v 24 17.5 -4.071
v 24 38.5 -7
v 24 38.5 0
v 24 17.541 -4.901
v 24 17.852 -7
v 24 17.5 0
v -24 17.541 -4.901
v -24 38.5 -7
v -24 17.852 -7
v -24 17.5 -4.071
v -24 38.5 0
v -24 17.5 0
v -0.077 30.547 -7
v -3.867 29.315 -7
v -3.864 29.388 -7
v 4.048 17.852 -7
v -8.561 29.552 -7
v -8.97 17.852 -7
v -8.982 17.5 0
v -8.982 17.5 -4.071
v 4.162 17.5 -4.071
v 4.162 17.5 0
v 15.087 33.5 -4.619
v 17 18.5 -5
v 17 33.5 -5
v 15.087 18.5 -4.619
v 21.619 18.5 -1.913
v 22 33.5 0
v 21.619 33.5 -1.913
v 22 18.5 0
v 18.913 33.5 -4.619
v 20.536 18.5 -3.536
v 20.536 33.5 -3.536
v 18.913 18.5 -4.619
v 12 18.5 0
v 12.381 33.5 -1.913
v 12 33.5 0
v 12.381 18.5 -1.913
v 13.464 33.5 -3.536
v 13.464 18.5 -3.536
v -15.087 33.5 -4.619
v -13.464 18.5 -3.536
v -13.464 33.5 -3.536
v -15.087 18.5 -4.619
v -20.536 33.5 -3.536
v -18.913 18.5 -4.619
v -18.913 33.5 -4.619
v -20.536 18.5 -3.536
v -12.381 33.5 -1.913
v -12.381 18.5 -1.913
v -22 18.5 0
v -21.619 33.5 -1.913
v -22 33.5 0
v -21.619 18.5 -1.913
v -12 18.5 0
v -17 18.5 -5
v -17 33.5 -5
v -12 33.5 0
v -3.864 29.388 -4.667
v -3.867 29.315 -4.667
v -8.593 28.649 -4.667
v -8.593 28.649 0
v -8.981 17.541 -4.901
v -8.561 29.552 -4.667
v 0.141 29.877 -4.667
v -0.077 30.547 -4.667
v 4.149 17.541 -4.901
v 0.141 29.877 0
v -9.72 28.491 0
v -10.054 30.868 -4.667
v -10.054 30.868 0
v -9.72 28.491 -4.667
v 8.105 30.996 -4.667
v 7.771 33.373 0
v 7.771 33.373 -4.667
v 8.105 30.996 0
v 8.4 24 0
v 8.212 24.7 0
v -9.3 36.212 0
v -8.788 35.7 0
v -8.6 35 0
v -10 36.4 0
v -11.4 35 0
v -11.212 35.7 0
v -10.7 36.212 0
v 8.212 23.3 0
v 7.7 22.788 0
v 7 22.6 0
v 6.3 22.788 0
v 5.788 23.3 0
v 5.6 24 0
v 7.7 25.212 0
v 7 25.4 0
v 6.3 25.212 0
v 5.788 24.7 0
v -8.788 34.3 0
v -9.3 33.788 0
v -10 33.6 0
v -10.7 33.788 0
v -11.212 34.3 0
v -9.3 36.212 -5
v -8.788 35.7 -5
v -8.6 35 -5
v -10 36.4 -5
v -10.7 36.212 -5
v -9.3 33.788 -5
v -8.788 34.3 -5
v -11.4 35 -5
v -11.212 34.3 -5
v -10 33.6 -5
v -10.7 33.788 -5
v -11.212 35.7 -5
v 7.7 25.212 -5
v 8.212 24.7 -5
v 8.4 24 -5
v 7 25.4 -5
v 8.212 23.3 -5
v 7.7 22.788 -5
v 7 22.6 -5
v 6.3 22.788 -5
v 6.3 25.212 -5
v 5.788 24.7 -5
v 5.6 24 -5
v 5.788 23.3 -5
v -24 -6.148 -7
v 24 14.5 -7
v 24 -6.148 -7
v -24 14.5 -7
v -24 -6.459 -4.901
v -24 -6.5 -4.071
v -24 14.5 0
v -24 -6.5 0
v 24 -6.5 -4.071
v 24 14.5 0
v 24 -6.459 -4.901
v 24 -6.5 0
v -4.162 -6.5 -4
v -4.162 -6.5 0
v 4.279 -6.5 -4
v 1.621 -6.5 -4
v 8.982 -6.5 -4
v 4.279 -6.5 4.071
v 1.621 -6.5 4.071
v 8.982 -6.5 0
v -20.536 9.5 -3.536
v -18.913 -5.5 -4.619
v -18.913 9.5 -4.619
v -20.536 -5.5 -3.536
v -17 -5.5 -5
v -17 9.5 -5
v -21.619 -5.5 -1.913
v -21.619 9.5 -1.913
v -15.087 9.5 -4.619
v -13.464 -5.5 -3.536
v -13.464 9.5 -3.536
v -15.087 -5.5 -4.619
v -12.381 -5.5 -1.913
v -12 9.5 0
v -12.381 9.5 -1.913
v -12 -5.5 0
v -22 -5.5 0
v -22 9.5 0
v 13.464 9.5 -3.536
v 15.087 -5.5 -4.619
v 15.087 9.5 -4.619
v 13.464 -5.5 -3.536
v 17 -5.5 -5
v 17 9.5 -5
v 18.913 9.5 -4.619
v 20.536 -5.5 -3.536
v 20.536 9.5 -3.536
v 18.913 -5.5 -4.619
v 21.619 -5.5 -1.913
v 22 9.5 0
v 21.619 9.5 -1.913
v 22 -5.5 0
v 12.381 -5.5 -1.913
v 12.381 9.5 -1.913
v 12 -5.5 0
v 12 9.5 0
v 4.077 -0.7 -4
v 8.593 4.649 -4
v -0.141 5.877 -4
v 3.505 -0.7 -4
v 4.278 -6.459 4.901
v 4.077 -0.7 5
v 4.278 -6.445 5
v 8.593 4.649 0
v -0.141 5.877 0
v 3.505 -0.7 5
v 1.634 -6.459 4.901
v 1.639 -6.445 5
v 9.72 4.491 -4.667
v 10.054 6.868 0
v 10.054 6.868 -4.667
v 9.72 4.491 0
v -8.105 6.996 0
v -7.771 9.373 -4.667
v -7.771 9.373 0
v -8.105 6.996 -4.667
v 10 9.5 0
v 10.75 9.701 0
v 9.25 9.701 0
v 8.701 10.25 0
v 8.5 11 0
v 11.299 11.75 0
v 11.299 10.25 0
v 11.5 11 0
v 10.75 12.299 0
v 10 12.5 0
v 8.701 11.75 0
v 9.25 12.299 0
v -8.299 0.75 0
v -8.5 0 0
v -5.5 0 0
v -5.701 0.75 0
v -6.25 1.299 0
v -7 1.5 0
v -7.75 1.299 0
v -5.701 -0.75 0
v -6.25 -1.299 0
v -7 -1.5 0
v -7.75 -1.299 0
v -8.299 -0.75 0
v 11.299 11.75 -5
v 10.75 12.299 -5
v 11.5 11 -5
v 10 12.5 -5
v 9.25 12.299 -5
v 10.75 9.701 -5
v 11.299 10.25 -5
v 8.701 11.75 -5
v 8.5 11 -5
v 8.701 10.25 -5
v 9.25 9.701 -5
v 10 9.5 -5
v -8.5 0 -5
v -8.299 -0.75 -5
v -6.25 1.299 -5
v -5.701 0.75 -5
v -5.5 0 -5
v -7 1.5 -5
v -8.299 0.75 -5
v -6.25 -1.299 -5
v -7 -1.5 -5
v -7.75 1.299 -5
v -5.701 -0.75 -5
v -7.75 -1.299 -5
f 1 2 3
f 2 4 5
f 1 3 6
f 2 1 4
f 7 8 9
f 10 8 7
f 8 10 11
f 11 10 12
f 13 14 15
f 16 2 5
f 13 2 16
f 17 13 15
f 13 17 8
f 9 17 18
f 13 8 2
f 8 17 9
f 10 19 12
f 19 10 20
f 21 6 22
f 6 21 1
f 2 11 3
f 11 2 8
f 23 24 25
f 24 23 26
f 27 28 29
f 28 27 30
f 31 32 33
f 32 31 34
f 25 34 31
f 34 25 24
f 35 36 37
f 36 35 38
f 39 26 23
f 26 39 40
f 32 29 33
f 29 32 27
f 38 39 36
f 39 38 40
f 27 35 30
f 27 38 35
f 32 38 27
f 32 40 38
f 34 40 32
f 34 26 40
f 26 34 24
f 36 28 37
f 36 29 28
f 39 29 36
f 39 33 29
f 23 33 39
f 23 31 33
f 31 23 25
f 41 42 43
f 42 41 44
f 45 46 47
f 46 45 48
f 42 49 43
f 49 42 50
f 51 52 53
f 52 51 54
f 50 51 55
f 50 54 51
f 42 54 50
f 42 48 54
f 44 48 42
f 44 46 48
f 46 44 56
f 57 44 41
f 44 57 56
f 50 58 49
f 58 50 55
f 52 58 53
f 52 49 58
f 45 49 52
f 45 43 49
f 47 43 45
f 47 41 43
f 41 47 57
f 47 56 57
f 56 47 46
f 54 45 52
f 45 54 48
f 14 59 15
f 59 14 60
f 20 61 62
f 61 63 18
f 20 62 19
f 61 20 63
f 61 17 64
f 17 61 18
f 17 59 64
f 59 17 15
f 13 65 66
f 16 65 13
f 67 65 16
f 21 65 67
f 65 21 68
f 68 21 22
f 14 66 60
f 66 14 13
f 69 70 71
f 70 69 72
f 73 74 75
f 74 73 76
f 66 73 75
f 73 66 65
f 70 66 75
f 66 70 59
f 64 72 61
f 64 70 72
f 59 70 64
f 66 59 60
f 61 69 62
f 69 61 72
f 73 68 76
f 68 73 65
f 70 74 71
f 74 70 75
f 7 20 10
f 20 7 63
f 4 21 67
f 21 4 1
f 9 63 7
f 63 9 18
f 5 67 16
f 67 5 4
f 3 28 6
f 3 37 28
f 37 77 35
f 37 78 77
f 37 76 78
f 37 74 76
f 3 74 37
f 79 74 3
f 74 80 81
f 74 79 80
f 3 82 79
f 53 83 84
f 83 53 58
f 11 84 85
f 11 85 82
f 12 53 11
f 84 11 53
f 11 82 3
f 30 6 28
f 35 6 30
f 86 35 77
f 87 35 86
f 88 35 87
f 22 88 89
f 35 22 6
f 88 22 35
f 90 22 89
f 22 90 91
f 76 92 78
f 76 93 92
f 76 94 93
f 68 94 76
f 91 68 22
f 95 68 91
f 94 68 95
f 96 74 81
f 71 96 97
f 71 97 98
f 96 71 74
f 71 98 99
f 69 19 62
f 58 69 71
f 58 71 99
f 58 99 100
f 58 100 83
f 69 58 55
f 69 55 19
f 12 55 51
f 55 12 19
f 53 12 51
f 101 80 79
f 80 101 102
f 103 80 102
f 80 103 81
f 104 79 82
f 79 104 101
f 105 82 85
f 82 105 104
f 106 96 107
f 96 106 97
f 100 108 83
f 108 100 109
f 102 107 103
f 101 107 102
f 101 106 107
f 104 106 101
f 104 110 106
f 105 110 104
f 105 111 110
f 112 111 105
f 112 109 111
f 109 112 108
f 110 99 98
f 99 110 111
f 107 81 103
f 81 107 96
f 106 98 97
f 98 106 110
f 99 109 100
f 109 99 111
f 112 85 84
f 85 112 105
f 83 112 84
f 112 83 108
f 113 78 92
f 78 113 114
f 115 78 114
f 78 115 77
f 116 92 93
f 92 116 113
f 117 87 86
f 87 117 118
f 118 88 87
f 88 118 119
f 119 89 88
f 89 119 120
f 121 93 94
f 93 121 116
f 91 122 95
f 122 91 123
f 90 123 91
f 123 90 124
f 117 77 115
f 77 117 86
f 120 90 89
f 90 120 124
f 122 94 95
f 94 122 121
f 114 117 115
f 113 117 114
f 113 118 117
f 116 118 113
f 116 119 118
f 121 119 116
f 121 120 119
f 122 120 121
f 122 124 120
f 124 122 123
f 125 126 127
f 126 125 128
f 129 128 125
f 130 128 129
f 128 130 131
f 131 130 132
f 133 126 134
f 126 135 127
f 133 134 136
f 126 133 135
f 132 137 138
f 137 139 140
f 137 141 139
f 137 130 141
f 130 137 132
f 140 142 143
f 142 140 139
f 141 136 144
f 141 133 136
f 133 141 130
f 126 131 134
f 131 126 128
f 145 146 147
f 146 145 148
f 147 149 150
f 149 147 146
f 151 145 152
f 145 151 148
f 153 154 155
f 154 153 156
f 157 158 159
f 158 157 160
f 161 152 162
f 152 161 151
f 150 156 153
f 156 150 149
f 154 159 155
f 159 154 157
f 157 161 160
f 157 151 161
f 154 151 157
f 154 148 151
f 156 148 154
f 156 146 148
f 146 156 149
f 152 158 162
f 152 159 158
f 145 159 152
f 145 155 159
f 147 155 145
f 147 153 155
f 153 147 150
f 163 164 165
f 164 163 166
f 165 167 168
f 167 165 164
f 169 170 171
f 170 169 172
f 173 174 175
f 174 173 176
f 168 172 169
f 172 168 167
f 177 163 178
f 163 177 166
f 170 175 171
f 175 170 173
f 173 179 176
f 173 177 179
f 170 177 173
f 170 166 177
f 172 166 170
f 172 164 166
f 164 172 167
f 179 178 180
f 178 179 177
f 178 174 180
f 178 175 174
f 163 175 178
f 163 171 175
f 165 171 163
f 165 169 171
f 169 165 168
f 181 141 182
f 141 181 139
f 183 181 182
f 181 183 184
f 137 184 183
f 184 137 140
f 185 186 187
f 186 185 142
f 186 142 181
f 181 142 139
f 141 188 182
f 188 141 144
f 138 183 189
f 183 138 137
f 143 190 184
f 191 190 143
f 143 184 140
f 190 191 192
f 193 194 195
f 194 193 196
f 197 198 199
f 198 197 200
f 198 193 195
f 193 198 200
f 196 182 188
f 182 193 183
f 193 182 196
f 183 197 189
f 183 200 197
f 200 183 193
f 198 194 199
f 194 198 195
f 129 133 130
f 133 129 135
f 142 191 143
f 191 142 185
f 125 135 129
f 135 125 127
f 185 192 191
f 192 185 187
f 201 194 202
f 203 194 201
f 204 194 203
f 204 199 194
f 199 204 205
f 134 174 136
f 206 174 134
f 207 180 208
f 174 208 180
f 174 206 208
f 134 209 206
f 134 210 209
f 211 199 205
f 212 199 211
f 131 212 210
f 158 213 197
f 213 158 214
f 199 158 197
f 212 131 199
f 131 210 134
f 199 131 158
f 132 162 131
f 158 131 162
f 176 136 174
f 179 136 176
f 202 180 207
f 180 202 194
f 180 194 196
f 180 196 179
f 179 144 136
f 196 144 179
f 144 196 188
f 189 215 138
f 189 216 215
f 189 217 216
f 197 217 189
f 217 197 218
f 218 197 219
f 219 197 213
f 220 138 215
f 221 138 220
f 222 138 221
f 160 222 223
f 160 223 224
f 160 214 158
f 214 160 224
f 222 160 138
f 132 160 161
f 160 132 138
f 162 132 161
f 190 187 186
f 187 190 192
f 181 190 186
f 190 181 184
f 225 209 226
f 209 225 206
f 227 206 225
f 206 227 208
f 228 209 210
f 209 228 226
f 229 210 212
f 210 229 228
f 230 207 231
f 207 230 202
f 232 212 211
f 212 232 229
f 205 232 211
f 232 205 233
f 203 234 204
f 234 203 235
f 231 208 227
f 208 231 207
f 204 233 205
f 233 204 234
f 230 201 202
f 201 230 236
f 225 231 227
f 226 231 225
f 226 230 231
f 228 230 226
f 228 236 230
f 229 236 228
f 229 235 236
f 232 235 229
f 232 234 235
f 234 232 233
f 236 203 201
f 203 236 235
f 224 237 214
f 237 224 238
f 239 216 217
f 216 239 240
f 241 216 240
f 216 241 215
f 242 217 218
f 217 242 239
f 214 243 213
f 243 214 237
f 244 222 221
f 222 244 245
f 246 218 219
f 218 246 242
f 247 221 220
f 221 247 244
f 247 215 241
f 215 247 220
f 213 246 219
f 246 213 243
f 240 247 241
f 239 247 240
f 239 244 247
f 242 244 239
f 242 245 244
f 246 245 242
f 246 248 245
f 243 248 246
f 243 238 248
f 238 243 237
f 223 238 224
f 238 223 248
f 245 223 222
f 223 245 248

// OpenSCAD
diameter=10;
height=4;
number=3;
distance=5;
baseline=30; 
nudge=3;


module maghole(diameter,height,number,back) {
		translate([0,height*(number-2)/2,0])
        rotate([90,0,0])
         cylinder(r=diameter/2,h=height*(2*number-1),center=true);
    if(back == 1) {
		translate([0,-height*2*(number+1)/2,0])
        rotate([90,0,0])
         cylinder(r=diameter/2,h=height*number,center=true);
    }
}

module smaghole(diameter,height,number,back) {
		translate([0,.15+height*(number-2)/2,0])
        rotate([90,0,0])
         cylinder(r=0.3+diameter/2,h=height*(2*number-1),center=true);
    if(back == 1) {
		translate([0,-(0.15+height*2*(number+1)/2),0])
        rotate([90,0,0])
         cylinder(r=0.3+diameter/2,h=height*number,center=true);
    }
}
module mirror(diameter,height,number,distance,baseline) {
width=diameter+4;
depth=distance+height*number+4;
length=baseline+diameter+8;
mirrorthick = 1.8;
   difference() {
     translate([0,-height,0])
	   cube([width,  // Small dimension
            depth, // Optical path dim
		      length],center=true);
      translate([0,-3.5,2+baseline/2])
             maghole(diameter,1+height/2,number,0);
     translate([0,-3.5,-(2+baseline/2)])
             maghole(diameter,1+height/2,number,0);

     rotate([-2,0,0])
     translate([-4,0.5+depth/4,-6.4])
          cube([width+2,depth+1,((length-2*width)/2)-5.3],center=true);

     rotate([18,0,0])
     translate([-4,depth/4,-0.8])
          cube([width+2,depth+2,((length-2*width)/2)-4.5],center=true);

    rotate([8,0,0])
     translate([0,-depth/3,0])
          cube([2*width/3,mirrorthick+0.6,length-(3*diameter)],center=true);
     }
}

module sensor(diameter,height,number,distance,baseline) {
width=diameter+4;
depth=distance+height*number+4;
length=baseline+diameter+8;
mirrorthick = 2.6;
extra=2*width+4;

   difference() {
     translate([2+width/2,-height,0])
	   cube([extra,  // Small dimension
            depth, // Optical path dim
		      length],center=true);
      translate([0,0,2+baseline/2])
             smaghole(diameter,height,number,1);
     translate([0,0,-(2+baseline/2)])
             smaghole(diameter,height,number,1);
//LASER
     translate([0,0,4])
        rotate([90,0,0])
             cylinder(r=3.2,h=40,center=true,$fn=24);
//PhotoTransistor
     translate([0,0,-2])
        rotate([90,0,0])
             cylinder(r=2,h=40,center=true,$fn=12);
// TEMP SENSOR
     translate([2+width,0,0])
        rotate([90,0,0])
             cylinder(r=4.7,h=40,center=true);

     }

     difference() {
     translate([0,-4,-2.5])cube([5,6,5],center=true);
     translate([0,-8,0])
        cylinder(r=3.2,h=10,center=true,$fn=12);
     translate([0,0,-1.2])
        rotate([90,0,0])
             cylinder(r=0.6,h=40,center=true,$fn=6);
     translate([0,0,-2.8])
        rotate([90,0,0])
             cylinder(r=0.6,h=40,center=true,$fn=6);
     }
}

module jarwall() {
  difference() {
     cube([40,40,120],center=true);
	  translate([40,0,0])
	     cylinder(r=50,h=120,center=true,$fn=64);
	   }
}

module jar() {
	  translate([-8,110,-10])
	          cylinder(r=50,h=120,center=true,$fn=64);
}

module powerhole(dim) {
offset = dim+2;
  //  cylinder(r=dim,h=2*dim,center=true,$fn=10);
  //  translate([dim-1.6,0,0])
   //   cylinder(r=dim,h=dim,center=true,$fn=10);
    translate([dim-3,0,0]) cube([2*dim+2,2*dim-1,2*dim-1],center=true);
    translate([-offset,0,0])
      cylinder(r=1.1,h=2*dim,center=true,$fn=10);
    translate([offset+2,0,0])
      cylinder(r=1.1,h=2*dim,center=true,$fn=10);
}

module sensordevice() {
  wall = 32;
  side = 44;
  deep = 50;
  difference() { 
   sensor(diameter,height,number,distance,baseline);
   translate([6,-60,3]) jar();
  }
  translate([-7,-(wall+30),21]) cube([wall,side+12,3]);

     translate([-7,-(wall+30),-24])
         cube([wall,side+12,3]);

  difference() {
  translate([23.5,-(wall+7),0])
    rotate([0,90,0])
    cube([side,deep,3],center=true);
     translate([24,-54,12])
			rotate([0,90,0]) 
           powerhole(4.5);
  }
}
module mirrordevice() {
  difference() { 
   mirror(diameter,height,number,distance,baseline);
   translate([0,-3.3,0]) rotate([0,0,-90]) jarwall();
  }
}
module horseshoe() {
  difference() {
     translate([0,0,5])cube([60,60,10],center=true);
     translate([5,-6,0])  cube([7,20,10],center=true);
  }
}
//horseshoe();

module onehalf() {

 difference() {
  rotate([0,90,180]) mirrordevice();
  horseshoe();
//Blunt the end
  translate([4,0.3,0.5]) cube([2,2,9],center=true);
//Pin holes
  translate([10,11,0])  cylinder(r=1.5,h=10,center=true,$fn=12);
  translate([-7,0,0]) cylinder(r=1.5,h=10,center=true,$fn=12);
 }
}

module otherhalf() {
  
 difference() {
  rotate([0,-90,180]) mirrordevice();
  translate([0,0,5])cube([60,60,10],center=true);

  translate([-10,11,0])  cylinder(r=1.4,h=10,center=true,$fn=12);
  translate([7,0,0]) cylinder(r=1.4,h=10,center=true,$fn=12);
  translate([-3,-4,-3]) cube([8,10,10],center=true);
 }

}
translate([0,24,0]) otherhalf();
onehalf();


     
